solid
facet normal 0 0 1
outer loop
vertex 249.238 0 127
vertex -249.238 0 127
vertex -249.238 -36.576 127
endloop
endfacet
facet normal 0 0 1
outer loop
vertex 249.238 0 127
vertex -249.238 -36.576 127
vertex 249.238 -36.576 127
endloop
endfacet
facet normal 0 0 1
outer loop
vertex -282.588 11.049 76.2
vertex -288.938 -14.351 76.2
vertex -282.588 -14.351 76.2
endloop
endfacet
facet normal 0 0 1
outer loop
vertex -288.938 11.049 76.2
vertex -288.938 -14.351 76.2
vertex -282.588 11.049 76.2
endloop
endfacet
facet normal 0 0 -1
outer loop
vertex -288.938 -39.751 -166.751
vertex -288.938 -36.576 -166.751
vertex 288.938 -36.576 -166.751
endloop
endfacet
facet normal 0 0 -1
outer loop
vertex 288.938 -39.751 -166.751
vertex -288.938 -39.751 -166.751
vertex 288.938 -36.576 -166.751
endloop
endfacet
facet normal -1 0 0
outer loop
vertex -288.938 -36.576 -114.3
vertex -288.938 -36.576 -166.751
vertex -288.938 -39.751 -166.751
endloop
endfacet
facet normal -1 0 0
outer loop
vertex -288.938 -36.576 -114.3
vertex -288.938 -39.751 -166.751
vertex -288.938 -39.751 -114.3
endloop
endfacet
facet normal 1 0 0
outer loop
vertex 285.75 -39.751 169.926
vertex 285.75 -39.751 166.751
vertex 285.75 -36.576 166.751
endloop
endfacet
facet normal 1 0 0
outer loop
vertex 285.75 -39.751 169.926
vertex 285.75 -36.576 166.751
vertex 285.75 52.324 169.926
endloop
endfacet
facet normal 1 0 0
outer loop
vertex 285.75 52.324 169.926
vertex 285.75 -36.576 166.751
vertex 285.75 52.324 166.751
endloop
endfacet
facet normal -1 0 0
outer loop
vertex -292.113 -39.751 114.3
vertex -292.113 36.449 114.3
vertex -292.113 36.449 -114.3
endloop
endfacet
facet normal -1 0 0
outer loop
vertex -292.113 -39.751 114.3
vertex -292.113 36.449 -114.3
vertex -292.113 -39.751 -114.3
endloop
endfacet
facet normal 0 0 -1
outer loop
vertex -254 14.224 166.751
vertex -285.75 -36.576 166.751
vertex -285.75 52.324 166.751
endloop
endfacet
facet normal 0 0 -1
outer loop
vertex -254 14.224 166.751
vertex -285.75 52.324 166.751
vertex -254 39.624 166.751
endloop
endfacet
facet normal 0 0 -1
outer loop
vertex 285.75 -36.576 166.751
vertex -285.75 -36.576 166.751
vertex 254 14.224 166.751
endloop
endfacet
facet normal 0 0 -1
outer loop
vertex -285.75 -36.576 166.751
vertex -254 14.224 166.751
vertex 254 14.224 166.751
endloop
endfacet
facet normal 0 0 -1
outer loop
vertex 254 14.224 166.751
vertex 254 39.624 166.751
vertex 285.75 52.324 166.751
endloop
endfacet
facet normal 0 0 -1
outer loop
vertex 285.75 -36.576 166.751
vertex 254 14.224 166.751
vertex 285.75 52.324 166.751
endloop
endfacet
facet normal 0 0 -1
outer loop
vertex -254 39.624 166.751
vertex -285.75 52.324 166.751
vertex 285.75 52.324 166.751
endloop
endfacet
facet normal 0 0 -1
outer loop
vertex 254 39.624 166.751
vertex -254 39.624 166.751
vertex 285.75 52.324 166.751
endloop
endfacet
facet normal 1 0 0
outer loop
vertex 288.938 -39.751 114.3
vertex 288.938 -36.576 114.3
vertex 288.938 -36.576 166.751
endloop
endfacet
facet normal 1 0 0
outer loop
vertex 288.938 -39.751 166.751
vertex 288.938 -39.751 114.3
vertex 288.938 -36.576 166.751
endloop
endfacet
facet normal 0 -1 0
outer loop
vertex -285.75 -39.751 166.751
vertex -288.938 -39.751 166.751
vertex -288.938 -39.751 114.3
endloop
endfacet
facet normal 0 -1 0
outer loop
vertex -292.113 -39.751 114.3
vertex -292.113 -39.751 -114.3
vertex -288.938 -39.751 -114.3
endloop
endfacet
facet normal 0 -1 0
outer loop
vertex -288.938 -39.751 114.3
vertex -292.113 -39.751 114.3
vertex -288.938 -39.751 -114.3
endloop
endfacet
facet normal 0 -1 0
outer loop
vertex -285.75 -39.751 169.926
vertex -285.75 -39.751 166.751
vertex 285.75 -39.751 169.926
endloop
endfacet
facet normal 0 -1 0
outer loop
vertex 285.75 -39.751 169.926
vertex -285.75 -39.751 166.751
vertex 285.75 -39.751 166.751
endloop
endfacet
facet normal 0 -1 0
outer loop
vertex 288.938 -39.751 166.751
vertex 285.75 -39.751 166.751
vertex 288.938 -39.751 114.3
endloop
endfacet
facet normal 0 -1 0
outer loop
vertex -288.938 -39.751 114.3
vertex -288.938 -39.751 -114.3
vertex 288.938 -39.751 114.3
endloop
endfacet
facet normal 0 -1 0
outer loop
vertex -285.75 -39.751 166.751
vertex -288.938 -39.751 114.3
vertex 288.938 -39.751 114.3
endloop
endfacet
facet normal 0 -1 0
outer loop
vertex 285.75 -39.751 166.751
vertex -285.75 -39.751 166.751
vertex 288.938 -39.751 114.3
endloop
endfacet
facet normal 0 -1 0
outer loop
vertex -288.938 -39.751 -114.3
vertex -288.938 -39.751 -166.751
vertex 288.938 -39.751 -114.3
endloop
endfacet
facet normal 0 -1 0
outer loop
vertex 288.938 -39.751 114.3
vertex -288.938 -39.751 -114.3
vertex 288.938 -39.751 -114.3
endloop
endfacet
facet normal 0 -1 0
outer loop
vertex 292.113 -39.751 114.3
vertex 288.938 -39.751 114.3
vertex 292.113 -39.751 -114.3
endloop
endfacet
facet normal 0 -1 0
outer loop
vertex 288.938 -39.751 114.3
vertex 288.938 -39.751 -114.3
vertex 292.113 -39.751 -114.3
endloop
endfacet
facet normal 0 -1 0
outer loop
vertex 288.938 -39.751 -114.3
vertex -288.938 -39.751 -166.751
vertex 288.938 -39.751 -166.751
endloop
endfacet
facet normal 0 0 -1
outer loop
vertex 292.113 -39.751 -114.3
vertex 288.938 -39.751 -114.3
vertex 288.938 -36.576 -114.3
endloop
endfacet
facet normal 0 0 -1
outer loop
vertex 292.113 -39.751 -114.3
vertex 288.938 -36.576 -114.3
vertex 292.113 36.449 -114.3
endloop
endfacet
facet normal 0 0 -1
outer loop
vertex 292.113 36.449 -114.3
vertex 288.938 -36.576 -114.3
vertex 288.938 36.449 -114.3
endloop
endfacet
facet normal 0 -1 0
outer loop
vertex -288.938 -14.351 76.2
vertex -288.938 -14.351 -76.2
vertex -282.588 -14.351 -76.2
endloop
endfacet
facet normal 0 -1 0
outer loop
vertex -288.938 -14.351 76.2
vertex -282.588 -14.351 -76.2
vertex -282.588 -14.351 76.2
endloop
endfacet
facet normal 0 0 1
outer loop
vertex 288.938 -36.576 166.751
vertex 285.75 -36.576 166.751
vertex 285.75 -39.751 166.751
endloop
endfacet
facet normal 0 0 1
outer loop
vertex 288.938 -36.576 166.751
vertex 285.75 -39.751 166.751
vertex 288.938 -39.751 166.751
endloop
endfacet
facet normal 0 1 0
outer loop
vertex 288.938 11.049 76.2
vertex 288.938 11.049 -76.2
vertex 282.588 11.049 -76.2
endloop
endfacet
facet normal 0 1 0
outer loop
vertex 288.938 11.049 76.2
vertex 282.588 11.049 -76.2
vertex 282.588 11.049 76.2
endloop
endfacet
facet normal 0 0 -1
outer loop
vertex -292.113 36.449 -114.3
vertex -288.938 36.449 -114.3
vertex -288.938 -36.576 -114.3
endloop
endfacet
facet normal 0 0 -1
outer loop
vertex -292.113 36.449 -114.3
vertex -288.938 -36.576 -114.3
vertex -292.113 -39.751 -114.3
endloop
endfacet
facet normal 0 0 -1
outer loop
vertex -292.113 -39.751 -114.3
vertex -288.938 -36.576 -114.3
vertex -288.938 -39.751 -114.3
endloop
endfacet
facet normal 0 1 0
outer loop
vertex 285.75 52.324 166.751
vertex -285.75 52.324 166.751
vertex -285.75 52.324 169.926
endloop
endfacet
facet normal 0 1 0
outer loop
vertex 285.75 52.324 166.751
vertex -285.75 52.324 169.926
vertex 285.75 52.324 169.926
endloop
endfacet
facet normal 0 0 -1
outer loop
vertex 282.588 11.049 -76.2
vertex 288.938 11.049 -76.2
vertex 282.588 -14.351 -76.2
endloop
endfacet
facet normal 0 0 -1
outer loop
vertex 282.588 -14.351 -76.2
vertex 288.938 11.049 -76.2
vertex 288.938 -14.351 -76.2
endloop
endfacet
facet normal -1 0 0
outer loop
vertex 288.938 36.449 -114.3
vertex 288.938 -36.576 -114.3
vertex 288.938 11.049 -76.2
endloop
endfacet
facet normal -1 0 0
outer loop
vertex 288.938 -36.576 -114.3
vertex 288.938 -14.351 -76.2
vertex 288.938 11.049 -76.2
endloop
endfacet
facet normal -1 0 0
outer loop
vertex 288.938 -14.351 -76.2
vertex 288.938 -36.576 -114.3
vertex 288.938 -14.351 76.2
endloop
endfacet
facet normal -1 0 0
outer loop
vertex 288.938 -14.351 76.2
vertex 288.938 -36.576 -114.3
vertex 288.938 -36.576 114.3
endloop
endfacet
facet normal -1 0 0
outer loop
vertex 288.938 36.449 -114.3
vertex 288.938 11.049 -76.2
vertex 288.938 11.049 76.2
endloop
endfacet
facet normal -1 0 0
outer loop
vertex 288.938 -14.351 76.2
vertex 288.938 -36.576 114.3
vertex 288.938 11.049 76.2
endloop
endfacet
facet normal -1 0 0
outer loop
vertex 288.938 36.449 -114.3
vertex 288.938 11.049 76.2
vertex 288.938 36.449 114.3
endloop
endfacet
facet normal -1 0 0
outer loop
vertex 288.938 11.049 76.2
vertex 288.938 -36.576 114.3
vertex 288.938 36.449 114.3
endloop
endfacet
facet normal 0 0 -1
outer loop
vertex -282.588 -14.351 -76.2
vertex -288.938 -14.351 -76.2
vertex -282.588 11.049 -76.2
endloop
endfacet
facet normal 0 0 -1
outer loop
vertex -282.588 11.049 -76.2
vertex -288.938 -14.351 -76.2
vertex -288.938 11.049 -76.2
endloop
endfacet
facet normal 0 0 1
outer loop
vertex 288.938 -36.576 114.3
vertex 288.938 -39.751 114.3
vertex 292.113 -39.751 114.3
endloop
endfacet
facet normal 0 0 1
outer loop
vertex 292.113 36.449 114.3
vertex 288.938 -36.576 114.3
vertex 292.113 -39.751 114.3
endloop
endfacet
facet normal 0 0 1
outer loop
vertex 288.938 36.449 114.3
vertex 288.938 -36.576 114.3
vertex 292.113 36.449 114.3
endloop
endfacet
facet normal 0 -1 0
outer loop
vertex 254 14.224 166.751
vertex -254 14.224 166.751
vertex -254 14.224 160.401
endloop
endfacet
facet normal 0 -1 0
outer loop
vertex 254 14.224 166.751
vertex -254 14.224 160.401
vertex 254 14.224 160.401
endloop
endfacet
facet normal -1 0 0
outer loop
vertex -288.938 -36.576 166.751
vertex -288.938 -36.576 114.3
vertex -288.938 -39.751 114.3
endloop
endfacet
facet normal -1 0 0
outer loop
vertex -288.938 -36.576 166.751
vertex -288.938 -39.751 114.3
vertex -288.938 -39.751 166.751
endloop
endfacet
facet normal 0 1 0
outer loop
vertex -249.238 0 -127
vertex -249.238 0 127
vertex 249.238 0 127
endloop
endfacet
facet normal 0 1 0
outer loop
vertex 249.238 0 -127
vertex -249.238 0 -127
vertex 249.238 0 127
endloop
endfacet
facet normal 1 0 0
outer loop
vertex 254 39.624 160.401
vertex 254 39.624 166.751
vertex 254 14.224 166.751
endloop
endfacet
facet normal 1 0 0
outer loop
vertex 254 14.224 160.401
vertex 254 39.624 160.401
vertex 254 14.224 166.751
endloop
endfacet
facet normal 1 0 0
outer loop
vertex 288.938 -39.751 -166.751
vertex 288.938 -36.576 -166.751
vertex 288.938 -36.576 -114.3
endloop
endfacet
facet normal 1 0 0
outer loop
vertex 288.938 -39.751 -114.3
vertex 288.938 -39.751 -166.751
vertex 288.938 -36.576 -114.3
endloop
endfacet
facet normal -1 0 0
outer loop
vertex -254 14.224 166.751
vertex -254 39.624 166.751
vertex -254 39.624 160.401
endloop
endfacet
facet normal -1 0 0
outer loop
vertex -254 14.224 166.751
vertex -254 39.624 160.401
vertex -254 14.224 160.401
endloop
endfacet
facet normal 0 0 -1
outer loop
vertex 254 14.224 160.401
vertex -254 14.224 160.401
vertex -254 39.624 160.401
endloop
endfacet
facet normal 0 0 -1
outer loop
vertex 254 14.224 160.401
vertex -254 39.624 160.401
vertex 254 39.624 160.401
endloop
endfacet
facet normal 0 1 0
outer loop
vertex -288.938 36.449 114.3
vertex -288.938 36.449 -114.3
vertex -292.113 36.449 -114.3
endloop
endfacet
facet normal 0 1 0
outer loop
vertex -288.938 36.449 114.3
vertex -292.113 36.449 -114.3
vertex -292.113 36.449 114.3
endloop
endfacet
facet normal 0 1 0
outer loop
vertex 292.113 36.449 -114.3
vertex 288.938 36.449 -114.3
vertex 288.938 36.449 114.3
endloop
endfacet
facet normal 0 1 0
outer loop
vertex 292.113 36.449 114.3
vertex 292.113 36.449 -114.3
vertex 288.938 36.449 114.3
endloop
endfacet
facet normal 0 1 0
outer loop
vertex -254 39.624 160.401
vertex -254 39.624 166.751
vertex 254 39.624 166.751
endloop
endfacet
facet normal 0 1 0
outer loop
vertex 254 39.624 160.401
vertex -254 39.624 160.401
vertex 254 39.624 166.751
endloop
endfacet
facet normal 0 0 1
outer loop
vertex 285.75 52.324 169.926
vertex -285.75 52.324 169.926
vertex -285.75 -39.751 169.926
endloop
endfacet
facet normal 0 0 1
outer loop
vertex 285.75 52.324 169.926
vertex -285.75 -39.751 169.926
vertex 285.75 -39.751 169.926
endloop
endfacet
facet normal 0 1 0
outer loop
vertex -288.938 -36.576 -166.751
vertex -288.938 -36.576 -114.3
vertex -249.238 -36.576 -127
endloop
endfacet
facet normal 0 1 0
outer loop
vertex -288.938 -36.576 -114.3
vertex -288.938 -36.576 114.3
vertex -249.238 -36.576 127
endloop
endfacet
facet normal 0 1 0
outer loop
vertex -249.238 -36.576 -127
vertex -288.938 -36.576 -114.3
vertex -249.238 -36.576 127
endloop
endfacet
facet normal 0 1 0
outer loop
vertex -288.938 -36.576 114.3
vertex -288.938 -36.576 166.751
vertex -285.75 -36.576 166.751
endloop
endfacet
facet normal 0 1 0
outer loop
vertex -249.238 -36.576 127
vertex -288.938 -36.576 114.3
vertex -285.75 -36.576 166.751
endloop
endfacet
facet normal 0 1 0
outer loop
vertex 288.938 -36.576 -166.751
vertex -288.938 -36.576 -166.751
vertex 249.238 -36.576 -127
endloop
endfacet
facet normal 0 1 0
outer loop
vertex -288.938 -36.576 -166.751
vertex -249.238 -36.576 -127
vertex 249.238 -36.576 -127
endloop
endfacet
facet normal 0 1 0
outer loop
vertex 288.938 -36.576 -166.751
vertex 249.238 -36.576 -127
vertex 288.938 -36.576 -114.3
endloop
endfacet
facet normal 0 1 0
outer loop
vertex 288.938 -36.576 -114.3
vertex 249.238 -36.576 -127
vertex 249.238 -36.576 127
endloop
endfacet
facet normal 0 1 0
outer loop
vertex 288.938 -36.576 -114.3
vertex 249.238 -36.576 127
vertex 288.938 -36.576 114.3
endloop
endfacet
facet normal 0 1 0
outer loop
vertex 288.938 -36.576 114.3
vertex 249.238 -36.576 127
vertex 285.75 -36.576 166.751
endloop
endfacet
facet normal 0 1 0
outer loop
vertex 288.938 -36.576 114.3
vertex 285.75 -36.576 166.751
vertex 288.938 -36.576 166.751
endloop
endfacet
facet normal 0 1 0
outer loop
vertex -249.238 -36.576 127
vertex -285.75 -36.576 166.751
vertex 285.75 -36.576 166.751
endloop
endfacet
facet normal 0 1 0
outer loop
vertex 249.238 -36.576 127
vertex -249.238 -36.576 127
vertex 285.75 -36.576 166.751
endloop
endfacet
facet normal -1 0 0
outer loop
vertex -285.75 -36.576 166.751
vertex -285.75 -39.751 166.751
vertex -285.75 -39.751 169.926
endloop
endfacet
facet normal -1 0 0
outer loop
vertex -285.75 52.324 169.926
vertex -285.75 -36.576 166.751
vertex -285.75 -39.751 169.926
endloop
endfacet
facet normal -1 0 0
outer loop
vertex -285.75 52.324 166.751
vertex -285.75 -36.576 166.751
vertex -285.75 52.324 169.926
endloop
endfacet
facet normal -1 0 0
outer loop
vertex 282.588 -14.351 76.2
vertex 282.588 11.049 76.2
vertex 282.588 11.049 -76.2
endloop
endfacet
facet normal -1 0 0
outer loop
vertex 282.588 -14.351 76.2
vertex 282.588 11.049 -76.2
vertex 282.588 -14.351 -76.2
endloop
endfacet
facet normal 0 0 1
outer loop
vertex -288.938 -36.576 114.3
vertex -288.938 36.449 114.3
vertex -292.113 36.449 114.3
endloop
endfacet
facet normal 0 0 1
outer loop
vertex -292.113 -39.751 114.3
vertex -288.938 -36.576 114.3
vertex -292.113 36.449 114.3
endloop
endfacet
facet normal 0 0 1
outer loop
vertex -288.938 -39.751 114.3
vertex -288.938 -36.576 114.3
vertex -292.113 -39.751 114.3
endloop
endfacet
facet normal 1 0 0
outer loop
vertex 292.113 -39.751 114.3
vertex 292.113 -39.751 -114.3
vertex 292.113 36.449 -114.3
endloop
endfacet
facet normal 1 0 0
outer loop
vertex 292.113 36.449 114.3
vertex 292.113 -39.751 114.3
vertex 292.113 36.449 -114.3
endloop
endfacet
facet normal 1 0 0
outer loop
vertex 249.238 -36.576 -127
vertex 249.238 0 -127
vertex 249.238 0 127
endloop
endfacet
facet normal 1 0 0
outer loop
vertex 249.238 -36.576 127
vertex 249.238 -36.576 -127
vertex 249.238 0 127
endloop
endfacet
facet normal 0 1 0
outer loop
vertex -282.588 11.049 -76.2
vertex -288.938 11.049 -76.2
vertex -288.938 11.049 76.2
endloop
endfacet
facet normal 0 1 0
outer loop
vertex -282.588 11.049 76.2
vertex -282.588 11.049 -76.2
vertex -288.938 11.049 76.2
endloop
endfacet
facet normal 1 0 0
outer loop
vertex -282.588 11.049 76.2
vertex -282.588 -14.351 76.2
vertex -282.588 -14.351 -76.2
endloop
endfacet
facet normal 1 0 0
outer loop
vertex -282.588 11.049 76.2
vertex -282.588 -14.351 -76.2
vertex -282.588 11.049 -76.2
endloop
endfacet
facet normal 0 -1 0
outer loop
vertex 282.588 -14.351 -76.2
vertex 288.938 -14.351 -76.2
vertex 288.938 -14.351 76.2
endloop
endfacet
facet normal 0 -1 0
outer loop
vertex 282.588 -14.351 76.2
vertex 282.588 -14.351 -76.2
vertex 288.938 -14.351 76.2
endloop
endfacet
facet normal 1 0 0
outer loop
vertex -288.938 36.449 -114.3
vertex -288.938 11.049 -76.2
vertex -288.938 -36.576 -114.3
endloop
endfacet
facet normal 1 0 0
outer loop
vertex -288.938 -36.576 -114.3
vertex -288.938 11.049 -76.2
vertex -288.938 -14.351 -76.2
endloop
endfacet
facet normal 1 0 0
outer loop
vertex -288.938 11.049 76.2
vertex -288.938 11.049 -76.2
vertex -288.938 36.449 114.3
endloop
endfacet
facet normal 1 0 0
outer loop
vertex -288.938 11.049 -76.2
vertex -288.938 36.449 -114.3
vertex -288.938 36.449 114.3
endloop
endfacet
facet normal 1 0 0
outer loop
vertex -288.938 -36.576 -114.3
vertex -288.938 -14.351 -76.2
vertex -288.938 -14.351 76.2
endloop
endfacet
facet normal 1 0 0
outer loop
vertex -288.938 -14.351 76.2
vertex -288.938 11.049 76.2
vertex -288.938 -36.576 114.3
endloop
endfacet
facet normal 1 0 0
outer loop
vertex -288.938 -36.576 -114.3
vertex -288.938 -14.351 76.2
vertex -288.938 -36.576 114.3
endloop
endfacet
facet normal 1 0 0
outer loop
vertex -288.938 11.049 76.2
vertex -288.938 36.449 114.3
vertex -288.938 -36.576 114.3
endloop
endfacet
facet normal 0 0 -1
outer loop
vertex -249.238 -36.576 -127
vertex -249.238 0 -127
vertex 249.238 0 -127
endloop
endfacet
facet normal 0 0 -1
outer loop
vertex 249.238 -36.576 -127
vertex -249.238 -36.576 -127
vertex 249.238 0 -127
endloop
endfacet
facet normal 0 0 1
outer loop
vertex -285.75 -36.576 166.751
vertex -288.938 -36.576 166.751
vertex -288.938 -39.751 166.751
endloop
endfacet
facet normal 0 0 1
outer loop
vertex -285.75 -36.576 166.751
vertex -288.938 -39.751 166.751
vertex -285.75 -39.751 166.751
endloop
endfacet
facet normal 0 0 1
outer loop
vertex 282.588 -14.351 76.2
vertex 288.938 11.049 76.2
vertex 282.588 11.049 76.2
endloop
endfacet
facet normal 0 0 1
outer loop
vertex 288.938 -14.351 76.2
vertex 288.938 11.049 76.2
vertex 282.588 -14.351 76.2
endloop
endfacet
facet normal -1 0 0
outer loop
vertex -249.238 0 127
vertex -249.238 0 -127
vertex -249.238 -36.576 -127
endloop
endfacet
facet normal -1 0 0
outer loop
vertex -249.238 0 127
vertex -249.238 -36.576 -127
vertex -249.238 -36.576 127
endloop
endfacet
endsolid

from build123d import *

# Parameters (mm, degrees)
F0_W      = 498.475
F0_H      = 254
F1_DEPTH  = 36.576
F2_W      = 577.8754
F2_H      = 333.502
F3_DEPTH  = 3.175
F4_W      = 76.2
F4_H      = 114.3
F5_DEPTH  = 3.175
F6_W      = 76.2
F6_H      = 228.6
F7_DEPTH  = 3.175
F8_W      = 25.4
F8_H      = 152.4
F9_DEPTH  = 6.35
F10_W     = 25.4
F10_H     = 152.4
F11_DEPTH = 6.35
F12_W     = 571.5
F12_H     = 92.075
F13_DEPTH = 3.175
F14_W     = 508
F14_H     = 25.4
F15_DEPTH = 6.35


with BuildPart() as f1:
    # F0 (on Front) → F1 (new body)
    with BuildSketch(Plane.XZ):
        Rectangle(F0_W, F0_H)
    extrude(amount=F1_DEPTH)

    # F2 (on face) → F3 (join)
    with BuildSketch(Plane.XZ.offset(36.576)):
        Rectangle(F2_W, F2_H)
    extrude(amount=F3_DEPTH)

    # F4 (on face) → F5 (join)
    with BuildSketch(Plane.YZ.offset(288.9377)):
        with Locations((-1.651, 57.15)):
            Rectangle(F4_W, F4_H)
        with Locations((-1.651, -57.15)):
            Rectangle(F4_W, F4_H)
    extrude(amount=F5_DEPTH)

    # F6 (on face) → F7 (join)
    with BuildSketch(Plane(origin=(-288.9377, 0, 0), x_dir=(0, -1, 0), z_dir=(-1, 0, 0))):
        with Locations((1.651, 0)):
            Rectangle(F6_W, F6_H)
    extrude(amount=F7_DEPTH)

    # F8 (on face) → F9 (join)
    with BuildSketch(Plane.YZ.offset(-288.9377)):
        with Locations((-1.651, 0)):
            Rectangle(F8_W, F8_H)
    extrude(amount=F9_DEPTH)

    # F10 (on face) → F11 (join)
    with BuildSketch(Plane(origin=(288.9377, 0, 0), x_dir=(0, -1, 0), z_dir=(-1, 0, 0))):
        with Locations((1.651, 0)):
            Rectangle(F10_W, F10_H)
    extrude(amount=F11_DEPTH)

    # F12 (on face) → F13 (join)
    with BuildSketch(Plane.XY.offset(166.751)):
        with Locations((0, 6.2865)):
            Rectangle(F12_W, F12_H)
    extrude(amount=F13_DEPTH)

    # F14 (on face) → F15 (join)
    with BuildSketch(Plane(origin=(0, 0, 166.751), x_dir=(1, 0, 0), z_dir=(0, 0, -1))):
        with Locations((0, -26.924)):
            Rectangle(F14_W, F14_H)
    extrude(amount=F15_DEPTH)


solid = f1.part
